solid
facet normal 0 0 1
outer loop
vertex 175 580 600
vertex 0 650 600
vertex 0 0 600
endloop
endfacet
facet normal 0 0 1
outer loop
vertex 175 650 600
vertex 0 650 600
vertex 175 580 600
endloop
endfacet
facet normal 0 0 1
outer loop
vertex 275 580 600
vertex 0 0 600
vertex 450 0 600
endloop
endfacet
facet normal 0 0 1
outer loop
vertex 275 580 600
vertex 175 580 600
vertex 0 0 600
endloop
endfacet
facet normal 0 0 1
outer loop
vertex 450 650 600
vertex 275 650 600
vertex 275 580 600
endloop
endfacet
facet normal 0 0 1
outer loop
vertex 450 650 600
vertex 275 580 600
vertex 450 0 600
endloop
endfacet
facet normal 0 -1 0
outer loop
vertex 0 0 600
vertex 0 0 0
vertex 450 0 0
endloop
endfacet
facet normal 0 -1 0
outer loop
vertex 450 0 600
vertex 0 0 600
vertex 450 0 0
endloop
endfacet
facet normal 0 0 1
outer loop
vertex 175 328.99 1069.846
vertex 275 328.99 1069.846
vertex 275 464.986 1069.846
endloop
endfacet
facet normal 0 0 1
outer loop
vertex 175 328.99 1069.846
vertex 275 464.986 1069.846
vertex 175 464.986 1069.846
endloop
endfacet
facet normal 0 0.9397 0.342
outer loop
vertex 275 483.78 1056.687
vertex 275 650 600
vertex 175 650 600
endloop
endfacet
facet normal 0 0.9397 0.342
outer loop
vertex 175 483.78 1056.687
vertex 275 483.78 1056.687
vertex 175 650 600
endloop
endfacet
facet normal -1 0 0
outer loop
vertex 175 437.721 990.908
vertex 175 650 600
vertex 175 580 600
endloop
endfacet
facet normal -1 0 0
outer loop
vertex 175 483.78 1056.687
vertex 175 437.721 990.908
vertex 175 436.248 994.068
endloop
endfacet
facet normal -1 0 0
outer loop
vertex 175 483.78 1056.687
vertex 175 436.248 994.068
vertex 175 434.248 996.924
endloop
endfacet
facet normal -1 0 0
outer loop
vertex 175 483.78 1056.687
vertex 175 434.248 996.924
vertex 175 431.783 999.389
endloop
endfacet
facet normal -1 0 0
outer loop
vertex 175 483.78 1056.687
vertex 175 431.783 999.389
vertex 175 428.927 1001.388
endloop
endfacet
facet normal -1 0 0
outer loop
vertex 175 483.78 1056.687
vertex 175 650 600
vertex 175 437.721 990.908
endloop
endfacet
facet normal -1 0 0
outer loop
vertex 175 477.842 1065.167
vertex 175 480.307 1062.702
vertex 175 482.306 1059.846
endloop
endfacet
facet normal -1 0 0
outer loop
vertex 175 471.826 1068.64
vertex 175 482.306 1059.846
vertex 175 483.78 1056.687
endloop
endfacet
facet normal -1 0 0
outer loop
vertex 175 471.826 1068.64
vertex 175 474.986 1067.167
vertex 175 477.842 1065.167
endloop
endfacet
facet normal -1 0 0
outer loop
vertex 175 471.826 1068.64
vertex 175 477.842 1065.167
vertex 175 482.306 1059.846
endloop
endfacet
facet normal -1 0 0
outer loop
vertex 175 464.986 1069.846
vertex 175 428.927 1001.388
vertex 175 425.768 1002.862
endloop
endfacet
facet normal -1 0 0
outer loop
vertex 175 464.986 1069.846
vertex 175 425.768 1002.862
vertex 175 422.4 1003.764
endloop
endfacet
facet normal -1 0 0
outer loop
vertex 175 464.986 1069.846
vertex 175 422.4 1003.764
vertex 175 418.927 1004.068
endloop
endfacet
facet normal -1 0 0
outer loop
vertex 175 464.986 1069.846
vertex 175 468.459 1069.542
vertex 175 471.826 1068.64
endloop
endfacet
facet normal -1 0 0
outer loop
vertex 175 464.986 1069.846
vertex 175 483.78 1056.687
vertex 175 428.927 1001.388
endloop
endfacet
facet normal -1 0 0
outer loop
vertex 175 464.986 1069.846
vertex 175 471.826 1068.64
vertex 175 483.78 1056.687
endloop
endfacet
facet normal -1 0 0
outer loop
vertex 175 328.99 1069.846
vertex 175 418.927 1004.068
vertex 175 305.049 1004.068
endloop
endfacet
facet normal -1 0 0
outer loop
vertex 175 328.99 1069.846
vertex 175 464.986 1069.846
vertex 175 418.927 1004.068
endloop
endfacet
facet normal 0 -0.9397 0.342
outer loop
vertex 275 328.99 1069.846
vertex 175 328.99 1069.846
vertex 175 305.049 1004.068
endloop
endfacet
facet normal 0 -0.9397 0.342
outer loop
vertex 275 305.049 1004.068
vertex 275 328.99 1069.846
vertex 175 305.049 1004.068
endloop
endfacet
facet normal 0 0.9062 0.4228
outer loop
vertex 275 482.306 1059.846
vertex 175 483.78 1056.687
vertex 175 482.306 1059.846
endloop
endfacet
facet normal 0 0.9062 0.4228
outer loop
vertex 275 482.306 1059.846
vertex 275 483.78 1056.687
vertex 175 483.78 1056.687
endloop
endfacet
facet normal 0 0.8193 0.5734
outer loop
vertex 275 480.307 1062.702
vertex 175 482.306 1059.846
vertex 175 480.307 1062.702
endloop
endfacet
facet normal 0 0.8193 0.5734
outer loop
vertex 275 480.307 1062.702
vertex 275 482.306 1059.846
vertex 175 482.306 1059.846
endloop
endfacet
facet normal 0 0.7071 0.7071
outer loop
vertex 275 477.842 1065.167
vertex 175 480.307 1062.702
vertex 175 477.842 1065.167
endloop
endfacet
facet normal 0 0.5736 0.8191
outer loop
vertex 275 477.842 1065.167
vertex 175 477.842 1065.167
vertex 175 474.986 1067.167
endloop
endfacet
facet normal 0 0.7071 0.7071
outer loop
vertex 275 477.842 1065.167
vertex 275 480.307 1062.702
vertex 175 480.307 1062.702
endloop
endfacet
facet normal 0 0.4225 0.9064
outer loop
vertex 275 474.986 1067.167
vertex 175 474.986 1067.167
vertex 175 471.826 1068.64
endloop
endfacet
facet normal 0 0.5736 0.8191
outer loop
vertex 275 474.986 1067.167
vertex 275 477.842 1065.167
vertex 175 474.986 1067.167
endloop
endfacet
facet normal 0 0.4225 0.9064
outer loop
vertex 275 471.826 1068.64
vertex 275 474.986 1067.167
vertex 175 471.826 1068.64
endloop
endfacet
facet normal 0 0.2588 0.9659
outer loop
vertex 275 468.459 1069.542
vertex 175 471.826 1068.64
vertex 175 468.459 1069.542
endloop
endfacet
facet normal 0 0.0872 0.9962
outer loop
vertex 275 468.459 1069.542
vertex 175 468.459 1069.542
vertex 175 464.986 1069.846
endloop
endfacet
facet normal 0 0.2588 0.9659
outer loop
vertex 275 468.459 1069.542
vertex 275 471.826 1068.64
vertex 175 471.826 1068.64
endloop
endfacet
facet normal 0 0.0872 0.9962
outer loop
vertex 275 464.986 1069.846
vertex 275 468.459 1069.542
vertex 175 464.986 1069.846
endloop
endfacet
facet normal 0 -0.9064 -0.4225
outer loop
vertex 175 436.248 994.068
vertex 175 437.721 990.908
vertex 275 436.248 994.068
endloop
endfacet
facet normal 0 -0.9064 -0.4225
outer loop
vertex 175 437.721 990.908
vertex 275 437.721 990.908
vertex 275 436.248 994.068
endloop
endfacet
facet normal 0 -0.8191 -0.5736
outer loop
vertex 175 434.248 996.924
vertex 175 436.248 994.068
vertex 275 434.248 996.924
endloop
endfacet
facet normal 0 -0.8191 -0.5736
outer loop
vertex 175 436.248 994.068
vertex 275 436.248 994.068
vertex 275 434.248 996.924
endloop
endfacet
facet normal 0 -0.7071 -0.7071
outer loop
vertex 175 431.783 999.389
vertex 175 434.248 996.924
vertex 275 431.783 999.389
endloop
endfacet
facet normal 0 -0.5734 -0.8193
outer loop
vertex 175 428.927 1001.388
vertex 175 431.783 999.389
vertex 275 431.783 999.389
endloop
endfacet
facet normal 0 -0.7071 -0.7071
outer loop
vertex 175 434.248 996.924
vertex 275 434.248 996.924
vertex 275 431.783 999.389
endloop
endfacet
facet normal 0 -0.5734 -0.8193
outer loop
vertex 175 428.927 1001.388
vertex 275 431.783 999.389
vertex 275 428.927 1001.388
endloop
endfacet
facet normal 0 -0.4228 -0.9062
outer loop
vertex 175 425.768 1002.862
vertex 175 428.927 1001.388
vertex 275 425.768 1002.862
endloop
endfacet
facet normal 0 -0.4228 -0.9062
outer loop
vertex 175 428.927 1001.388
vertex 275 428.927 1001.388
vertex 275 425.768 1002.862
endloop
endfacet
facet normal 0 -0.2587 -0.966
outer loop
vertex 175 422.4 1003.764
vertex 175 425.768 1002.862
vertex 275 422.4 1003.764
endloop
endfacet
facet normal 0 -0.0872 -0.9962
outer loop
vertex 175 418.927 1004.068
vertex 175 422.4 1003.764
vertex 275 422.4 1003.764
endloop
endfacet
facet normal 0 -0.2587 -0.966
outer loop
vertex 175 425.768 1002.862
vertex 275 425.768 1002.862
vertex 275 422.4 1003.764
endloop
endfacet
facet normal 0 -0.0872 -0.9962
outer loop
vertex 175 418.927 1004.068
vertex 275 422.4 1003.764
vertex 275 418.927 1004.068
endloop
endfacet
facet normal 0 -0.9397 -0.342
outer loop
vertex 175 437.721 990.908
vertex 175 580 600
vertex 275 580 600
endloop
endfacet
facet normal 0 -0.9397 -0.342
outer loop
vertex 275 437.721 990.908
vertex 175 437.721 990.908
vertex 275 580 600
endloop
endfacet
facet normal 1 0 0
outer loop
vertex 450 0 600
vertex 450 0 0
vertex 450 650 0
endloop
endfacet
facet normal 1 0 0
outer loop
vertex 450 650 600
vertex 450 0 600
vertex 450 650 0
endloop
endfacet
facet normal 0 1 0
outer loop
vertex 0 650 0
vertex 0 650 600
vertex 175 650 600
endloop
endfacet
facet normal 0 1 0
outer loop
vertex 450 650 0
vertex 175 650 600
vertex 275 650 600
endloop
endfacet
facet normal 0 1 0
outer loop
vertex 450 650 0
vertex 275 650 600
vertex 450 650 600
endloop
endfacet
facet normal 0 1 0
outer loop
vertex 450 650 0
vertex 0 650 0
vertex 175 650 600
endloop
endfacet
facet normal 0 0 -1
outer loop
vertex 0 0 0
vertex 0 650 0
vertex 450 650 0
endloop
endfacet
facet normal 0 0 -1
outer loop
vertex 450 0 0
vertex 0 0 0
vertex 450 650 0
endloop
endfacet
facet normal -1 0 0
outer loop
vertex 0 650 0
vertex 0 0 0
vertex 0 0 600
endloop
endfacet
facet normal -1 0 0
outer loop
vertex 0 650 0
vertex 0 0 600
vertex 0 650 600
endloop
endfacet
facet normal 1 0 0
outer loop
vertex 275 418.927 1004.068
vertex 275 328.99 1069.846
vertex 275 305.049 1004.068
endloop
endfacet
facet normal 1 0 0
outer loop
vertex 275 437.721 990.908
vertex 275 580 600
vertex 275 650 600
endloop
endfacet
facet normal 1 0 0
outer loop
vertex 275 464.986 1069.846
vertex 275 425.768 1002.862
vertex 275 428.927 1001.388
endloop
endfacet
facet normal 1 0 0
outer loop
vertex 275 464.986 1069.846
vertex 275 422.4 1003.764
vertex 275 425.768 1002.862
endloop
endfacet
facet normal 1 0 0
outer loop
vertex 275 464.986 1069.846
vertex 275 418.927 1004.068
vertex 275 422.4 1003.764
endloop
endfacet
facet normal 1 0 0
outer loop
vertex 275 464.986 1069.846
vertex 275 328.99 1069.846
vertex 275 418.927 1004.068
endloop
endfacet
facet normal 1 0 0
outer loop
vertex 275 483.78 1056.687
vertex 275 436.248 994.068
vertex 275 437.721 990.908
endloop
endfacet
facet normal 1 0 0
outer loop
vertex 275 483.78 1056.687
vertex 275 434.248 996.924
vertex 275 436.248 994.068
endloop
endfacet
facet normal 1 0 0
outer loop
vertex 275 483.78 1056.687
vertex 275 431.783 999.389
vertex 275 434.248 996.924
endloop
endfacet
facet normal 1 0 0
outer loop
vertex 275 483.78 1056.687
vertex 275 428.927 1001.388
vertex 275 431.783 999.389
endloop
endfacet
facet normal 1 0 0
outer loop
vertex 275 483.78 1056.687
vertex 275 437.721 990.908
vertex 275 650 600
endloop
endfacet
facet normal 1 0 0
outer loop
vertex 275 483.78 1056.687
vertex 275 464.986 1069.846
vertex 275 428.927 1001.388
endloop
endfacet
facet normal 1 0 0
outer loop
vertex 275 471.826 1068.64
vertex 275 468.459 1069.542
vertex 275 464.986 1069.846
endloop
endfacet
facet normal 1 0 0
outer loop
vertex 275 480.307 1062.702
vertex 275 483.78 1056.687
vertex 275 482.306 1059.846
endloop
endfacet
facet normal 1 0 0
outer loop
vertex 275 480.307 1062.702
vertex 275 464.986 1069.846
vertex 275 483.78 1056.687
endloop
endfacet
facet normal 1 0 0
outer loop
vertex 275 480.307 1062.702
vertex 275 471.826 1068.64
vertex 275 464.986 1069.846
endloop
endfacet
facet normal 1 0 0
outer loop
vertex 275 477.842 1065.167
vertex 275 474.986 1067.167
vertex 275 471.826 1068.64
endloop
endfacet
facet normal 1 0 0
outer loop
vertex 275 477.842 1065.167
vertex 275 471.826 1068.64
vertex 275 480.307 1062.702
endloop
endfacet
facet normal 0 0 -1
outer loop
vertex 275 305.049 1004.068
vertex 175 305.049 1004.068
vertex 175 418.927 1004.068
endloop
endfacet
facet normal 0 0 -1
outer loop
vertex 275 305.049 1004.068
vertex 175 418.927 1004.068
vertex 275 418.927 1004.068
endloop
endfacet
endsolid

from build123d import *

# Parameters (mm, degrees)
F0_W     = 450
F0_H     = 650
F1_DEPTH = 600
F2_W     = 100
F2_H     = 70
F6_R     = 20


with BuildPart() as f1:
    # F0 (on Top) → F1 (new body)
    with BuildSketch(Plane.XY):
        with Locations((225, 325)):
            Rectangle(F0_W, F0_H)
    extrude(amount=F1_DEPTH)

    # F5: sweep along a path in F4
    with BuildLine(Plane.YZ.offset(225)) as f5_path:
        Line((650, 600), (478.9899283372, 1069.846310393))
        Line((478.9899283372, 1069.846310393), (328.9899283372, 1069.846310393))
    # F2 (on face) → F5 (sweep)
    with BuildSketch(Plane.XY.offset(600)):
        with Locations((225, 615)):
            Rectangle(F2_W, F2_H)
    sweep(path=f5_path.line, transition=Transition.RIGHT)

    # F6
    f6_edges = [f1.edges().sort_by_distance(p)[0] for p in [
        (225, 478.989928, 1069.84631),
        (225, 432.931338, 1004.067827),
    ]]
    fillet(f6_edges, radius=F6_R)


solid = f1.part
